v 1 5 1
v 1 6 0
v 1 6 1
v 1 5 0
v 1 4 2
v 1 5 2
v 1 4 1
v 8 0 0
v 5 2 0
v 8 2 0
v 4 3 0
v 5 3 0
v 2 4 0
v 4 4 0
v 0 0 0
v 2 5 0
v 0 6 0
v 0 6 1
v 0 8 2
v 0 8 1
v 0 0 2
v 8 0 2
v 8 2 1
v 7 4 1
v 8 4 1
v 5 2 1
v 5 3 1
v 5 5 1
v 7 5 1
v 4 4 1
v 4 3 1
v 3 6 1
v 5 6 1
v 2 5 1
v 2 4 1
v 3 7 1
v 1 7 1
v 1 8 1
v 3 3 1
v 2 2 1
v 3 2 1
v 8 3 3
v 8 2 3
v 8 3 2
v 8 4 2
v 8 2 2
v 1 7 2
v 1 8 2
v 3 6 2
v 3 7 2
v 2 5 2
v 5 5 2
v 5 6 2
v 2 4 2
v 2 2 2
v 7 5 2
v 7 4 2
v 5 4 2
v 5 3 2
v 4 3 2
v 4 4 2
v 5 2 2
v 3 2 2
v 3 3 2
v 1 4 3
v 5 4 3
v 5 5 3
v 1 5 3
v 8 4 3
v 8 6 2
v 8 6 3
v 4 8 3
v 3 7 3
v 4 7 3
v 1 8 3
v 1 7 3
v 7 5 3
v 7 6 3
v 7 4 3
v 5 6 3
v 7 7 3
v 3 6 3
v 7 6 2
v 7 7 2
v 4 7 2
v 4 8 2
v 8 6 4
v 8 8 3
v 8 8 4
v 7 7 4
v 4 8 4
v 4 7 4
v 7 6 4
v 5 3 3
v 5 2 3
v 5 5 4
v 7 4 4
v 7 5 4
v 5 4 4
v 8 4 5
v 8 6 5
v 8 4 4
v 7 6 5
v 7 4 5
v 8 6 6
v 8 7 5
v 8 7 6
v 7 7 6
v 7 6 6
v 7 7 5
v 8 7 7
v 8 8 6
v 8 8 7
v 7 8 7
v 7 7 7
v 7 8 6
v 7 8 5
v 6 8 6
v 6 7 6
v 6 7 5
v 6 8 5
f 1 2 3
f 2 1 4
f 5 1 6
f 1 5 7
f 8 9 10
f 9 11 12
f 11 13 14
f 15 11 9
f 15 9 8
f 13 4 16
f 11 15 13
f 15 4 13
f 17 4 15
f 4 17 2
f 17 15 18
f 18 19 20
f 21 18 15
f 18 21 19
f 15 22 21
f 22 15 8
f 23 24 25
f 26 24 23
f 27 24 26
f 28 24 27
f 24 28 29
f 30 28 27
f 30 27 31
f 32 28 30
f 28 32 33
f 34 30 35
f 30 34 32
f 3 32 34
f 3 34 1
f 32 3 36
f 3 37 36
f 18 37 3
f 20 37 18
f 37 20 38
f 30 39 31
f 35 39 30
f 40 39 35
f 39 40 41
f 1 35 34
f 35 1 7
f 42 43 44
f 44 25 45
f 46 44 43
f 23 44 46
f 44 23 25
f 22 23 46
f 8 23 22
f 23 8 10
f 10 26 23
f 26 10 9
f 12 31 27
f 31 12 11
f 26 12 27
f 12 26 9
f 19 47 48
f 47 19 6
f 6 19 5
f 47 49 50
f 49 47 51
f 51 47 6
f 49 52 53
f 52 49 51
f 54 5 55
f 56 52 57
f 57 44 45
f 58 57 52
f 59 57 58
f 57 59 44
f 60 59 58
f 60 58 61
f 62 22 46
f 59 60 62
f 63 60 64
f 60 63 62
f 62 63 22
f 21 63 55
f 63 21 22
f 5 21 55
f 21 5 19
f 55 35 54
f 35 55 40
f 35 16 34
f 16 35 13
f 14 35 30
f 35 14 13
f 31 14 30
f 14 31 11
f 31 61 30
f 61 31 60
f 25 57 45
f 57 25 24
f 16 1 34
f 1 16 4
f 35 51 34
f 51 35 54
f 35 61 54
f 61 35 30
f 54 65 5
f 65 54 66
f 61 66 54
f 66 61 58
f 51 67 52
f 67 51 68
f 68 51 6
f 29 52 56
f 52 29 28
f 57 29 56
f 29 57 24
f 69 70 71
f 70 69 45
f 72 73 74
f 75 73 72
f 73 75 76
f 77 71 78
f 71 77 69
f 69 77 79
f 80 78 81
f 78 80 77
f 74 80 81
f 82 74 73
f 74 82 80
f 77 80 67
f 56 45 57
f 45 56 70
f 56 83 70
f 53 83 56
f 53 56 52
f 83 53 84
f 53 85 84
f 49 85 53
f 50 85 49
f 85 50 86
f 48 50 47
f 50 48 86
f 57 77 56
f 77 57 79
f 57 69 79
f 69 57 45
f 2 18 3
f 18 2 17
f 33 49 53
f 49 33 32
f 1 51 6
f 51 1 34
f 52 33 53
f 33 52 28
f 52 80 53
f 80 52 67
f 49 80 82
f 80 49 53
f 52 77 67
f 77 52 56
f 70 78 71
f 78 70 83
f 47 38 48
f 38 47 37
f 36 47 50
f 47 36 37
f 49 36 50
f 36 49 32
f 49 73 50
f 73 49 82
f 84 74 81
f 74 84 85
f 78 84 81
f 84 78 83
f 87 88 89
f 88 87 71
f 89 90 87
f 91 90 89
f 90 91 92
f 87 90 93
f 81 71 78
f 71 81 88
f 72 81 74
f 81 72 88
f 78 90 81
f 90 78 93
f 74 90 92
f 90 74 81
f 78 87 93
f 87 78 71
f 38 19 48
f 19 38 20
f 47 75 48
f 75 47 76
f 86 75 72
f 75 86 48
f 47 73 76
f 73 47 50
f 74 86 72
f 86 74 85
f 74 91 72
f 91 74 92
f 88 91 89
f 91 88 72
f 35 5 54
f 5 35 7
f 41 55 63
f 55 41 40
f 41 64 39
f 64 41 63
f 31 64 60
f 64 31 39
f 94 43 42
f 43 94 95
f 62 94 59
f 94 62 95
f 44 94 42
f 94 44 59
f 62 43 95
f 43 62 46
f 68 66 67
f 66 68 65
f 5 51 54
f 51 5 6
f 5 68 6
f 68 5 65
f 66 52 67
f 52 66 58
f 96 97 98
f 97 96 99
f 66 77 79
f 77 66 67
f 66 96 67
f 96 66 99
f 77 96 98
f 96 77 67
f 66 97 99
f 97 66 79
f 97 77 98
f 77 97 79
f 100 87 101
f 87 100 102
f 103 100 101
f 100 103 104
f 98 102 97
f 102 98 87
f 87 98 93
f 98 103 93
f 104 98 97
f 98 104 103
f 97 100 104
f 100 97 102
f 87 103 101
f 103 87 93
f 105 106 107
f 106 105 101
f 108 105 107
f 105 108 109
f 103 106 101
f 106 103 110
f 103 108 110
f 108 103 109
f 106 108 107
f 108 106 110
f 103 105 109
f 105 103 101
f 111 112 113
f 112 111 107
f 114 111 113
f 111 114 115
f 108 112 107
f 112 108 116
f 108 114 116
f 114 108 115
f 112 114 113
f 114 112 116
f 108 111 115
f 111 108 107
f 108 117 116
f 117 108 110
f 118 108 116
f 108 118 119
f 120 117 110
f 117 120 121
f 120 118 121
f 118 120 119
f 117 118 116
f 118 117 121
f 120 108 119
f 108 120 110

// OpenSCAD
union() {
    translate([0, 0, 0]) cube([1, 1, 1]);
    translate([1, 0, 0]) cube([1, 1, 1]);
    translate([2, 0, 0]) cube([1, 1, 1]);
    translate([3, 0, 0]) cube([1, 1, 1]);
    translate([4, 0, 0]) cube([1, 1, 1]);
    translate([5, 0, 0]) cube([1, 1, 1]);
    translate([6, 0, 0]) cube([1, 1, 1]);
    translate([7, 0, 0]) cube([1, 1, 1]);
    translate([0, 1, 0]) cube([1, 1, 1]);
    translate([1, 1, 0]) cube([1, 1, 1]);
    translate([2, 1, 0]) cube([1, 1, 1]);
    translate([3, 1, 0]) cube([1, 1, 1]);
    translate([4, 1, 0]) cube([1, 1, 1]);
    translate([5, 1, 0]) cube([1, 1, 1]);
    translate([6, 1, 0]) cube([1, 1, 1]);
    translate([7, 1, 0]) cube([1, 1, 1]);
    translate([0, 2, 0]) cube([1, 1, 1]);
    translate([1, 2, 0]) cube([1, 1, 1]);
    translate([2, 2, 0]) cube([1, 1, 1]);
    translate([3, 2, 0]) cube([1, 1, 1]);
    translate([4, 2, 0]) cube([1, 1, 1]);
    translate([5, 2, 1]) cube([1, 1, 1]);
    translate([6, 2, 1]) cube([1, 1, 1]);
    translate([7, 2, 1]) cube([1, 1, 1]);
    translate([0, 3, 0]) cube([1, 1, 1]);
    translate([1, 3, 0]) cube([1, 1, 1]);
    translate([2, 3, 0]) cube([1, 1, 1]);
    translate([3, 3, 0]) cube([1, 1, 1]);
    translate([4, 3, 1]) cube([1, 1, 1]);
    translate([5, 3, 1]) cube([1, 1, 1]);
    translate([6, 3, 1]) cube([1, 1, 1]);
    translate([7, 3, 1]) cube([1, 1, 1]);
    translate([0, 4, 0]) cube([1, 1, 1]);
    translate([1, 4, 0]) cube([1, 1, 1]);
    translate([2, 4, 1]) cube([1, 1, 1]);
    translate([3, 4, 1]) cube([1, 1, 1]);
    translate([4, 4, 1]) cube([1, 1, 1]);
    translate([5, 4, 1]) cube([1, 1, 1]);
    translate([6, 4, 1]) cube([1, 1, 1]);
    translate([7, 4, 2]) cube([1, 1, 1]);
    translate([0, 5, 0]) cube([1, 1, 1]);
    translate([1, 5, 1]) cube([1, 1, 1]);
    translate([2, 5, 1]) cube([1, 1, 1]);
    translate([3, 5, 1]) cube([1, 1, 1]);
    translate([4, 5, 1]) cube([1, 1, 1]);
    translate([5, 5, 2]) cube([1, 1, 1]);
    translate([6, 5, 2]) cube([1, 1, 1]);
    translate([7, 5, 2]) cube([1, 1, 1]);
    translate([0, 6, 1]) cube([1, 1, 1]);
    translate([1, 6, 1]) cube([1, 1, 1]);
    translate([2, 6, 1]) cube([1, 1, 1]);
    translate([3, 6, 2]) cube([1, 1, 1]);
    translate([4, 6, 2]) cube([1, 1, 1]);
    translate([5, 6, 2]) cube([1, 1, 1]);
    translate([6, 6, 2]) cube([1, 1, 1]);
    translate([7, 6, 3]) cube([1, 1, 1]);
    translate([0, 7, 1]) cube([1, 1, 1]);
    translate([1, 7, 2]) cube([1, 1, 1]);
    translate([2, 7, 2]) cube([1, 1, 1]);
    translate([3, 7, 2]) cube([1, 1, 1]);
    translate([4, 7, 3]) cube([1, 1, 1]);
    translate([5, 7, 3]) cube([1, 1, 1]);
    translate([6, 7, 3]) cube([1, 1, 1]);
    translate([7, 7, 3]) cube([1, 1, 1]);
    translate([0, 0, 1]) cube([1, 1, 1]);
    translate([0, 1, 1]) cube([1, 1, 1]);
    translate([0, 2, 1]) cube([1, 1, 1]);
    translate([0, 3, 1]) cube([1, 1, 1]);
    translate([0, 4, 1]) cube([1, 1, 1]);
    translate([0, 5, 1]) cube([1, 1, 1]);
    translate([1, 0, 1]) cube([1, 1, 1]);
    translate([1, 1, 1]) cube([1, 1, 1]);
    translate([1, 2, 1]) cube([1, 1, 1]);
    translate([1, 3, 1]) cube([1, 1, 1]);
    translate([2, 0, 1]) cube([1, 1, 1]);
    translate([2, 1, 1]) cube([1, 1, 1]);
    translate([3, 0, 1]) cube([1, 1, 1]);
    translate([3, 1, 1]) cube([1, 1, 1]);
    translate([3, 2, 1]) cube([1, 1, 1]);
    translate([4, 0, 1]) cube([1, 1, 1]);
    translate([4, 1, 1]) cube([1, 1, 1]);
    translate([4, 2, 1]) cube([1, 1, 1]);
    translate([5, 0, 1]) cube([1, 1, 1]);
    translate([5, 1, 1]) cube([1, 1, 1]);
    translate([5, 2, 2]) cube([1, 1, 1]);
    translate([6, 0, 1]) cube([1, 1, 1]);
    translate([6, 1, 1]) cube([1, 1, 1]);
    translate([6, 2, 2]) cube([1, 1, 1]);
    translate([7, 0, 1]) cube([1, 1, 1]);
    translate([7, 1, 1]) cube([1, 1, 1]);
    translate([7, 2, 2]) cube([1, 1, 1]);
    translate([1, 4, 2]) cube([1, 1, 1]);
    translate([2, 4, 2]) cube([1, 1, 1]);
    translate([3, 4, 2]) cube([1, 1, 1]);
    translate([4, 4, 2]) cube([1, 1, 1]);
    translate([5, 4, 3]) cube([1, 1, 1]);
    translate([6, 4, 3]) cube([1, 1, 1]);
    translate([7, 4, 4]) cube([1, 1, 1]);
    translate([7, 5, 4]) cube([1, 1, 1]);
    translate([7, 6, 5]) cube([1, 1, 1]);
    translate([7, 7, 6]) cube([1, 1, 1]);
    translate([6, 7, 5]) cube([1, 1, 1]);
}
